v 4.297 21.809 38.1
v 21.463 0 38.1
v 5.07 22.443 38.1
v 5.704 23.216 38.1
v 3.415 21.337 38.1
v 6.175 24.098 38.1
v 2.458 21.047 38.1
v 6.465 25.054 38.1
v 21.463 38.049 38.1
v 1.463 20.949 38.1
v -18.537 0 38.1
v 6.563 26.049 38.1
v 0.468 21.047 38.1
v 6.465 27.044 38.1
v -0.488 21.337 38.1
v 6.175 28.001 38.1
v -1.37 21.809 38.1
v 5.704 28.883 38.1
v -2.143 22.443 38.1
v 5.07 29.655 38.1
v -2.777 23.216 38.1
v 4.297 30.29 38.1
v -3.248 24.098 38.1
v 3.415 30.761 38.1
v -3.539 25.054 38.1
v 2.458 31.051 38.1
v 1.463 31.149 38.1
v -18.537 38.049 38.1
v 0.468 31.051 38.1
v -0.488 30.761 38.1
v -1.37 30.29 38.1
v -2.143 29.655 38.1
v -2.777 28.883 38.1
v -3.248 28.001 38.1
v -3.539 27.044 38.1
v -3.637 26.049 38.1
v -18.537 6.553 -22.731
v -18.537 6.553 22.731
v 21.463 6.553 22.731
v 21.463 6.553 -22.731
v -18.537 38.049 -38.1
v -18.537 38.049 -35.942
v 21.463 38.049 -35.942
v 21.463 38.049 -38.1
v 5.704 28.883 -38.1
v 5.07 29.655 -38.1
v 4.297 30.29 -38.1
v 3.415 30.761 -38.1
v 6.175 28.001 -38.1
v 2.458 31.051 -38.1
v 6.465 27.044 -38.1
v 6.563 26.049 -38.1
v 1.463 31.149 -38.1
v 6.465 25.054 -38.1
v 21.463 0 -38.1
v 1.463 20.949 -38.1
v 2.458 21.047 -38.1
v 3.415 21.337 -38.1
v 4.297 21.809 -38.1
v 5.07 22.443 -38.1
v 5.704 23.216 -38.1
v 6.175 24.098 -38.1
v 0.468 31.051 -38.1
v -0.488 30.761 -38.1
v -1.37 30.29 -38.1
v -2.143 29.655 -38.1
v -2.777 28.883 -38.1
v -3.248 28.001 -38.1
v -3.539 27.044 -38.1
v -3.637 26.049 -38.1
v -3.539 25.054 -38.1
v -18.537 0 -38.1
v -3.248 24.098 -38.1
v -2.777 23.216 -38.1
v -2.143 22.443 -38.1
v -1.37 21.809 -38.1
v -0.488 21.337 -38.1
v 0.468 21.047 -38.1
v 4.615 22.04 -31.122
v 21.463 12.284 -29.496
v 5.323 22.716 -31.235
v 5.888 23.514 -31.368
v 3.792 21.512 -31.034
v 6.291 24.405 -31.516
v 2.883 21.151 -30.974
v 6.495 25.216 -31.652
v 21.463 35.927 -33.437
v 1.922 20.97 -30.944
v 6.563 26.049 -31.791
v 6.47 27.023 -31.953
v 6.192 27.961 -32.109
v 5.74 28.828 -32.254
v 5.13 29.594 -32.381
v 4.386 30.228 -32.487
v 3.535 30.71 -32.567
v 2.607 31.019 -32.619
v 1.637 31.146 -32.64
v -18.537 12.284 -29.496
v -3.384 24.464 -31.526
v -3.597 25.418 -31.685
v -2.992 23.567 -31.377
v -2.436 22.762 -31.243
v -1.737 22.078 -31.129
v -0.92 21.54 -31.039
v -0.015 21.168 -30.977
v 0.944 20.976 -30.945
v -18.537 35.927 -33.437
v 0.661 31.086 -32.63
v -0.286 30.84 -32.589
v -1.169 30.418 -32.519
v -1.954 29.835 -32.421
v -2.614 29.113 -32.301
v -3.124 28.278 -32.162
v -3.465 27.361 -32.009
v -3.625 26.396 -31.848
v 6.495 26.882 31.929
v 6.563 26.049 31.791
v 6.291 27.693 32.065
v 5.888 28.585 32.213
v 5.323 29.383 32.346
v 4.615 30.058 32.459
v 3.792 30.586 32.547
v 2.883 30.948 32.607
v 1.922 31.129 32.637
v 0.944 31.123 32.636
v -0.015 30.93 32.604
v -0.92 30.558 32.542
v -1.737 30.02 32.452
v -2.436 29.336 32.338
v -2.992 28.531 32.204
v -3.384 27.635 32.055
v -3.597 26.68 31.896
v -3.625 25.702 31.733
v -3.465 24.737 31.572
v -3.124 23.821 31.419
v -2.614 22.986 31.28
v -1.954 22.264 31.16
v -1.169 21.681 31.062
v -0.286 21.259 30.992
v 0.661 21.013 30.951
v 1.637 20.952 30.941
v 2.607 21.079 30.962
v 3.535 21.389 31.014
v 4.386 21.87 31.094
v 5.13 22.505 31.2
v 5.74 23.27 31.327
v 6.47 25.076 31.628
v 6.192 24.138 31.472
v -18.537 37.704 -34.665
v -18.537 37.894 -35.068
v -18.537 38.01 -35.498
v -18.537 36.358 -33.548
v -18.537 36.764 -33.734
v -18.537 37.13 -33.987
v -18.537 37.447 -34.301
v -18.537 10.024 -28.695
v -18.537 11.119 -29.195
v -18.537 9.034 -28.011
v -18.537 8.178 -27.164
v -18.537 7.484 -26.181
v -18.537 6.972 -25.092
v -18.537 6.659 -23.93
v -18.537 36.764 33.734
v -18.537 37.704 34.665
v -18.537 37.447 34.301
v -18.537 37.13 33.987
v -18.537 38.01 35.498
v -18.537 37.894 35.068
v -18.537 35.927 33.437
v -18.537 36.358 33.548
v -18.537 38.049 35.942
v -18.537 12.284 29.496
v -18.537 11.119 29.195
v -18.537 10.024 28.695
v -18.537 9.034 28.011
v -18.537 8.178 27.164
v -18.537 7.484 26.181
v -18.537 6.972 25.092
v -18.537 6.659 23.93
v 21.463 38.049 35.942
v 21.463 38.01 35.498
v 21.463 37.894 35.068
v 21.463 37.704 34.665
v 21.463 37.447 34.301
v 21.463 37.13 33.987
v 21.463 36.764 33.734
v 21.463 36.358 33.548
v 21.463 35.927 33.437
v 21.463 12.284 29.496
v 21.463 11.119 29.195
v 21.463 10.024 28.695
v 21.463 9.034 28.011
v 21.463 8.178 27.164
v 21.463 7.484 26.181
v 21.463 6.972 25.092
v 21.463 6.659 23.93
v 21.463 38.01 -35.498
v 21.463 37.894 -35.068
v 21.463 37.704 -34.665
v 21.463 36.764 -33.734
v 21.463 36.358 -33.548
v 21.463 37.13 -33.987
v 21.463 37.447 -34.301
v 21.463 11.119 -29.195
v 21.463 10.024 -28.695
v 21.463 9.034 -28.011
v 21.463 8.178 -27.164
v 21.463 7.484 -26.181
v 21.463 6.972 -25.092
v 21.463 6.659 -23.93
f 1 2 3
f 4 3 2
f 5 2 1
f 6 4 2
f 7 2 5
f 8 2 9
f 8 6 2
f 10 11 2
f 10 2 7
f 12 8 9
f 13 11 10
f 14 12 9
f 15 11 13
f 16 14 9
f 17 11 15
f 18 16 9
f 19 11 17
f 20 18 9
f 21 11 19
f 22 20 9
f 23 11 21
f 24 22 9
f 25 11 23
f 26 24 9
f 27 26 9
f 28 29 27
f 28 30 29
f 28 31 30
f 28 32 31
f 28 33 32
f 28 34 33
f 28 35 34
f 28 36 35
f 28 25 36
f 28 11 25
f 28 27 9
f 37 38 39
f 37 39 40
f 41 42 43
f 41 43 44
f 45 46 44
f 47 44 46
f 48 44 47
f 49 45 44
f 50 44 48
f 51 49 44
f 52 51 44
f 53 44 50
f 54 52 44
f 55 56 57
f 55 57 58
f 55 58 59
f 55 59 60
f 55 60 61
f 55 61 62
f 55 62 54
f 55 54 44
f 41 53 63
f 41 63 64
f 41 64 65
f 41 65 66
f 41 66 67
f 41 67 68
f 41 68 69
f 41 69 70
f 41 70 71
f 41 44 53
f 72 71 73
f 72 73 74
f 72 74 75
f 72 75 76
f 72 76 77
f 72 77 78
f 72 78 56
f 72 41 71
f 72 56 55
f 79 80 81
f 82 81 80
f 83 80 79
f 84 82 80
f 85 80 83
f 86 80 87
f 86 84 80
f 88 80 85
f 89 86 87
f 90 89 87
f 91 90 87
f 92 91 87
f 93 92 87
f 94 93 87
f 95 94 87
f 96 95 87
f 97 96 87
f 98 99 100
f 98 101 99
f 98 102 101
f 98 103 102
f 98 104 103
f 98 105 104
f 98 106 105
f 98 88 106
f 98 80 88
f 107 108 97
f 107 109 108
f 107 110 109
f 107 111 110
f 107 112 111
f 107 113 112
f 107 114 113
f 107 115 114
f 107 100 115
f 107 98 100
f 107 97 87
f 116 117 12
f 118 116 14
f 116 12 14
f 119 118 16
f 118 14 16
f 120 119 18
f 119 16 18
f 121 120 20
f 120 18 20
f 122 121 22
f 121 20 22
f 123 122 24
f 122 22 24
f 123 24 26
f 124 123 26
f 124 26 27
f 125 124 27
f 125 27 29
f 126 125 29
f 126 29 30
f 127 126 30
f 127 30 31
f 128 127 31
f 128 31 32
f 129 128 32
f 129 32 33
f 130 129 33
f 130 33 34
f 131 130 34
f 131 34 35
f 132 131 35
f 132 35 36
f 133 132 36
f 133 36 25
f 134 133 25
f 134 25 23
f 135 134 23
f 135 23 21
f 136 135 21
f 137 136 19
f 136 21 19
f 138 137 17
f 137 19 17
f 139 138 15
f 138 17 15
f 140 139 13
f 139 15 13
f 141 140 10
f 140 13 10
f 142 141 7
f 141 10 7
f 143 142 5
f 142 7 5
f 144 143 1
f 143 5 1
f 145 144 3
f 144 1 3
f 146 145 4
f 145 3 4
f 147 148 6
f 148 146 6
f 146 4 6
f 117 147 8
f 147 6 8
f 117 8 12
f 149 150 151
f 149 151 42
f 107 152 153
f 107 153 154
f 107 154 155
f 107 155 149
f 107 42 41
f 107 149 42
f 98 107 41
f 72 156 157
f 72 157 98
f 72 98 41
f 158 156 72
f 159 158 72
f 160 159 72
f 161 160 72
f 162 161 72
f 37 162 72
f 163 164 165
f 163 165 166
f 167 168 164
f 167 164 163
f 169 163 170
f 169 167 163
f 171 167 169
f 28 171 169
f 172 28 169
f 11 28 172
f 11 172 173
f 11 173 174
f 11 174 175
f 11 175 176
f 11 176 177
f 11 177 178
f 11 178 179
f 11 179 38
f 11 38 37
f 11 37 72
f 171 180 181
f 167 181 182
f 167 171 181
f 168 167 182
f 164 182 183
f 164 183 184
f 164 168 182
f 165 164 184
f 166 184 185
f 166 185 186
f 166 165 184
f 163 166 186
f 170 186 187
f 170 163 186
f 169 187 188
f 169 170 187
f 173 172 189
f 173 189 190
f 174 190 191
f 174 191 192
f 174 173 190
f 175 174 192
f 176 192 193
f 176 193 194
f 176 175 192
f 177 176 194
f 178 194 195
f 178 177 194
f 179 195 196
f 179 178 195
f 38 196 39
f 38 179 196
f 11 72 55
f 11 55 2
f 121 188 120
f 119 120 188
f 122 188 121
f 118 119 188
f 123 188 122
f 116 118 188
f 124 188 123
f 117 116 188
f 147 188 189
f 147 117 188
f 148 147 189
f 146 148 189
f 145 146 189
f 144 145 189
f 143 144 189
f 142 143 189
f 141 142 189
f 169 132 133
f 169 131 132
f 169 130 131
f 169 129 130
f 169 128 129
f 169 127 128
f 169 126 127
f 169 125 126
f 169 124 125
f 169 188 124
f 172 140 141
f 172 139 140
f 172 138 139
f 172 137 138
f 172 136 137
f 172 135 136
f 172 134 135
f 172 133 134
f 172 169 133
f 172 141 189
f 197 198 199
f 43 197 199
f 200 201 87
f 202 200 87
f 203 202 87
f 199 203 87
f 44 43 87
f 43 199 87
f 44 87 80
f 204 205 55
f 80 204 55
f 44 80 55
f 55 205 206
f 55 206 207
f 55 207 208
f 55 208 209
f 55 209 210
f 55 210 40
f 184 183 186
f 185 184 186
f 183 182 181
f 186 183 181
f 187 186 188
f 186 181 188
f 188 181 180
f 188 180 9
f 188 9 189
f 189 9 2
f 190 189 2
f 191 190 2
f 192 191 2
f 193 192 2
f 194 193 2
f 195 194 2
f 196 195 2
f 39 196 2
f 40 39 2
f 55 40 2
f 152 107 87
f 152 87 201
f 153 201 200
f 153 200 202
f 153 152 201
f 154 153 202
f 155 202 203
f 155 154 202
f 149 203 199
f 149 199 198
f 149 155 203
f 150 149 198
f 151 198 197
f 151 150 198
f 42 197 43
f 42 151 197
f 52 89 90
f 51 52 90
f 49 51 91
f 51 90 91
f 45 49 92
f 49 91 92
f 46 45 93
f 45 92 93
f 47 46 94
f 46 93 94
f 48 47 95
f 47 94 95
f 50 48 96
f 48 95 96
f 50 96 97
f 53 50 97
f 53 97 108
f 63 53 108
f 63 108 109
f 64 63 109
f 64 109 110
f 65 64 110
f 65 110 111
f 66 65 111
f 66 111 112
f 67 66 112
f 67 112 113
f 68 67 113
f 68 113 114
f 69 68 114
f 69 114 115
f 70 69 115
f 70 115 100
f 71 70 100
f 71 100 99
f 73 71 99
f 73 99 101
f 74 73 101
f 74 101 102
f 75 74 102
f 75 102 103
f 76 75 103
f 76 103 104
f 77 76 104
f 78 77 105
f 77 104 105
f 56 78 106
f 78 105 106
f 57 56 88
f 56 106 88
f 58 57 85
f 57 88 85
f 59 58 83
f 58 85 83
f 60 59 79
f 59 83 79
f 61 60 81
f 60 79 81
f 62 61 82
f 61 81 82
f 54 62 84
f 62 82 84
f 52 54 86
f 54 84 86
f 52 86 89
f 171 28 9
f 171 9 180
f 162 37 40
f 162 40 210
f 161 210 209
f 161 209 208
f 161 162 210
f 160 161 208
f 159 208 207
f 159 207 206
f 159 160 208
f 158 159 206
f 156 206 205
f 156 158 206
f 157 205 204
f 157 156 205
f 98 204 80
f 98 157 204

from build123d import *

# Parameters (mm, degrees)
MIEMBRO_ESTRUCTURAL1_DEPTH = 40
CROQUIS4_R                 = 5.1
CORTAR_EXTRUIR1_DEPTH      = 88.834257761


with BuildPart() as part:
    # Sketch1 → Miembro estructural1 (new body)
    with BuildSketch(Plane.YZ.offset(-18.536654135)):
        with BuildLine():
            Line((0, -38.1), (0, 38.1))
            Line((0, 38.1), (38.0492, 38.1))
            Line((38.0492, 38.1), (38.0492, 35.942335136))
            ThreePointArc((38.0492, 35.942335136), (37.447280466, 34.300554363), (35.926803066, 33.436899509))
            Line((35.926803066, 33.436899509), (12.283671721, 29.496090157))
            ThreePointArc((12.283671721, 29.496090157), (8.178382741, 27.164222052), (6.5532, 22.731413966))
            Line((6.5532, 22.731413966), (6.5532, -22.731413966))
            ThreePointArc((6.5532, -22.731413966), (8.178382741, -27.164222052), (12.283671721, -29.496090157))
            Line((12.283671721, -29.496090157), (35.926803066, -33.436899509))
            ThreePointArc((35.926803066, -33.436899509), (37.447280466, -34.300554363), (38.0492, -35.942335136))
            Line((38.0492, -35.942335136), (38.0492, -38.1))
            Line((38.0492, -38.1), (0, -38.1))
        make_face()
    extrude(amount=MIEMBRO_ESTRUCTURAL1_DEPTH)

    # Croquis4 → Cortar-Extruir1 (cut, through all)
    with BuildSketch(Plane.XY.offset(38.1)):
        with Locations((1.463345865, 26.0492)):
            Circle(CROQUIS4_R)
    extrude(amount=-CORTAR_EXTRUIR1_DEPTH, mode=Mode.SUBTRACT)


solid = part.part
